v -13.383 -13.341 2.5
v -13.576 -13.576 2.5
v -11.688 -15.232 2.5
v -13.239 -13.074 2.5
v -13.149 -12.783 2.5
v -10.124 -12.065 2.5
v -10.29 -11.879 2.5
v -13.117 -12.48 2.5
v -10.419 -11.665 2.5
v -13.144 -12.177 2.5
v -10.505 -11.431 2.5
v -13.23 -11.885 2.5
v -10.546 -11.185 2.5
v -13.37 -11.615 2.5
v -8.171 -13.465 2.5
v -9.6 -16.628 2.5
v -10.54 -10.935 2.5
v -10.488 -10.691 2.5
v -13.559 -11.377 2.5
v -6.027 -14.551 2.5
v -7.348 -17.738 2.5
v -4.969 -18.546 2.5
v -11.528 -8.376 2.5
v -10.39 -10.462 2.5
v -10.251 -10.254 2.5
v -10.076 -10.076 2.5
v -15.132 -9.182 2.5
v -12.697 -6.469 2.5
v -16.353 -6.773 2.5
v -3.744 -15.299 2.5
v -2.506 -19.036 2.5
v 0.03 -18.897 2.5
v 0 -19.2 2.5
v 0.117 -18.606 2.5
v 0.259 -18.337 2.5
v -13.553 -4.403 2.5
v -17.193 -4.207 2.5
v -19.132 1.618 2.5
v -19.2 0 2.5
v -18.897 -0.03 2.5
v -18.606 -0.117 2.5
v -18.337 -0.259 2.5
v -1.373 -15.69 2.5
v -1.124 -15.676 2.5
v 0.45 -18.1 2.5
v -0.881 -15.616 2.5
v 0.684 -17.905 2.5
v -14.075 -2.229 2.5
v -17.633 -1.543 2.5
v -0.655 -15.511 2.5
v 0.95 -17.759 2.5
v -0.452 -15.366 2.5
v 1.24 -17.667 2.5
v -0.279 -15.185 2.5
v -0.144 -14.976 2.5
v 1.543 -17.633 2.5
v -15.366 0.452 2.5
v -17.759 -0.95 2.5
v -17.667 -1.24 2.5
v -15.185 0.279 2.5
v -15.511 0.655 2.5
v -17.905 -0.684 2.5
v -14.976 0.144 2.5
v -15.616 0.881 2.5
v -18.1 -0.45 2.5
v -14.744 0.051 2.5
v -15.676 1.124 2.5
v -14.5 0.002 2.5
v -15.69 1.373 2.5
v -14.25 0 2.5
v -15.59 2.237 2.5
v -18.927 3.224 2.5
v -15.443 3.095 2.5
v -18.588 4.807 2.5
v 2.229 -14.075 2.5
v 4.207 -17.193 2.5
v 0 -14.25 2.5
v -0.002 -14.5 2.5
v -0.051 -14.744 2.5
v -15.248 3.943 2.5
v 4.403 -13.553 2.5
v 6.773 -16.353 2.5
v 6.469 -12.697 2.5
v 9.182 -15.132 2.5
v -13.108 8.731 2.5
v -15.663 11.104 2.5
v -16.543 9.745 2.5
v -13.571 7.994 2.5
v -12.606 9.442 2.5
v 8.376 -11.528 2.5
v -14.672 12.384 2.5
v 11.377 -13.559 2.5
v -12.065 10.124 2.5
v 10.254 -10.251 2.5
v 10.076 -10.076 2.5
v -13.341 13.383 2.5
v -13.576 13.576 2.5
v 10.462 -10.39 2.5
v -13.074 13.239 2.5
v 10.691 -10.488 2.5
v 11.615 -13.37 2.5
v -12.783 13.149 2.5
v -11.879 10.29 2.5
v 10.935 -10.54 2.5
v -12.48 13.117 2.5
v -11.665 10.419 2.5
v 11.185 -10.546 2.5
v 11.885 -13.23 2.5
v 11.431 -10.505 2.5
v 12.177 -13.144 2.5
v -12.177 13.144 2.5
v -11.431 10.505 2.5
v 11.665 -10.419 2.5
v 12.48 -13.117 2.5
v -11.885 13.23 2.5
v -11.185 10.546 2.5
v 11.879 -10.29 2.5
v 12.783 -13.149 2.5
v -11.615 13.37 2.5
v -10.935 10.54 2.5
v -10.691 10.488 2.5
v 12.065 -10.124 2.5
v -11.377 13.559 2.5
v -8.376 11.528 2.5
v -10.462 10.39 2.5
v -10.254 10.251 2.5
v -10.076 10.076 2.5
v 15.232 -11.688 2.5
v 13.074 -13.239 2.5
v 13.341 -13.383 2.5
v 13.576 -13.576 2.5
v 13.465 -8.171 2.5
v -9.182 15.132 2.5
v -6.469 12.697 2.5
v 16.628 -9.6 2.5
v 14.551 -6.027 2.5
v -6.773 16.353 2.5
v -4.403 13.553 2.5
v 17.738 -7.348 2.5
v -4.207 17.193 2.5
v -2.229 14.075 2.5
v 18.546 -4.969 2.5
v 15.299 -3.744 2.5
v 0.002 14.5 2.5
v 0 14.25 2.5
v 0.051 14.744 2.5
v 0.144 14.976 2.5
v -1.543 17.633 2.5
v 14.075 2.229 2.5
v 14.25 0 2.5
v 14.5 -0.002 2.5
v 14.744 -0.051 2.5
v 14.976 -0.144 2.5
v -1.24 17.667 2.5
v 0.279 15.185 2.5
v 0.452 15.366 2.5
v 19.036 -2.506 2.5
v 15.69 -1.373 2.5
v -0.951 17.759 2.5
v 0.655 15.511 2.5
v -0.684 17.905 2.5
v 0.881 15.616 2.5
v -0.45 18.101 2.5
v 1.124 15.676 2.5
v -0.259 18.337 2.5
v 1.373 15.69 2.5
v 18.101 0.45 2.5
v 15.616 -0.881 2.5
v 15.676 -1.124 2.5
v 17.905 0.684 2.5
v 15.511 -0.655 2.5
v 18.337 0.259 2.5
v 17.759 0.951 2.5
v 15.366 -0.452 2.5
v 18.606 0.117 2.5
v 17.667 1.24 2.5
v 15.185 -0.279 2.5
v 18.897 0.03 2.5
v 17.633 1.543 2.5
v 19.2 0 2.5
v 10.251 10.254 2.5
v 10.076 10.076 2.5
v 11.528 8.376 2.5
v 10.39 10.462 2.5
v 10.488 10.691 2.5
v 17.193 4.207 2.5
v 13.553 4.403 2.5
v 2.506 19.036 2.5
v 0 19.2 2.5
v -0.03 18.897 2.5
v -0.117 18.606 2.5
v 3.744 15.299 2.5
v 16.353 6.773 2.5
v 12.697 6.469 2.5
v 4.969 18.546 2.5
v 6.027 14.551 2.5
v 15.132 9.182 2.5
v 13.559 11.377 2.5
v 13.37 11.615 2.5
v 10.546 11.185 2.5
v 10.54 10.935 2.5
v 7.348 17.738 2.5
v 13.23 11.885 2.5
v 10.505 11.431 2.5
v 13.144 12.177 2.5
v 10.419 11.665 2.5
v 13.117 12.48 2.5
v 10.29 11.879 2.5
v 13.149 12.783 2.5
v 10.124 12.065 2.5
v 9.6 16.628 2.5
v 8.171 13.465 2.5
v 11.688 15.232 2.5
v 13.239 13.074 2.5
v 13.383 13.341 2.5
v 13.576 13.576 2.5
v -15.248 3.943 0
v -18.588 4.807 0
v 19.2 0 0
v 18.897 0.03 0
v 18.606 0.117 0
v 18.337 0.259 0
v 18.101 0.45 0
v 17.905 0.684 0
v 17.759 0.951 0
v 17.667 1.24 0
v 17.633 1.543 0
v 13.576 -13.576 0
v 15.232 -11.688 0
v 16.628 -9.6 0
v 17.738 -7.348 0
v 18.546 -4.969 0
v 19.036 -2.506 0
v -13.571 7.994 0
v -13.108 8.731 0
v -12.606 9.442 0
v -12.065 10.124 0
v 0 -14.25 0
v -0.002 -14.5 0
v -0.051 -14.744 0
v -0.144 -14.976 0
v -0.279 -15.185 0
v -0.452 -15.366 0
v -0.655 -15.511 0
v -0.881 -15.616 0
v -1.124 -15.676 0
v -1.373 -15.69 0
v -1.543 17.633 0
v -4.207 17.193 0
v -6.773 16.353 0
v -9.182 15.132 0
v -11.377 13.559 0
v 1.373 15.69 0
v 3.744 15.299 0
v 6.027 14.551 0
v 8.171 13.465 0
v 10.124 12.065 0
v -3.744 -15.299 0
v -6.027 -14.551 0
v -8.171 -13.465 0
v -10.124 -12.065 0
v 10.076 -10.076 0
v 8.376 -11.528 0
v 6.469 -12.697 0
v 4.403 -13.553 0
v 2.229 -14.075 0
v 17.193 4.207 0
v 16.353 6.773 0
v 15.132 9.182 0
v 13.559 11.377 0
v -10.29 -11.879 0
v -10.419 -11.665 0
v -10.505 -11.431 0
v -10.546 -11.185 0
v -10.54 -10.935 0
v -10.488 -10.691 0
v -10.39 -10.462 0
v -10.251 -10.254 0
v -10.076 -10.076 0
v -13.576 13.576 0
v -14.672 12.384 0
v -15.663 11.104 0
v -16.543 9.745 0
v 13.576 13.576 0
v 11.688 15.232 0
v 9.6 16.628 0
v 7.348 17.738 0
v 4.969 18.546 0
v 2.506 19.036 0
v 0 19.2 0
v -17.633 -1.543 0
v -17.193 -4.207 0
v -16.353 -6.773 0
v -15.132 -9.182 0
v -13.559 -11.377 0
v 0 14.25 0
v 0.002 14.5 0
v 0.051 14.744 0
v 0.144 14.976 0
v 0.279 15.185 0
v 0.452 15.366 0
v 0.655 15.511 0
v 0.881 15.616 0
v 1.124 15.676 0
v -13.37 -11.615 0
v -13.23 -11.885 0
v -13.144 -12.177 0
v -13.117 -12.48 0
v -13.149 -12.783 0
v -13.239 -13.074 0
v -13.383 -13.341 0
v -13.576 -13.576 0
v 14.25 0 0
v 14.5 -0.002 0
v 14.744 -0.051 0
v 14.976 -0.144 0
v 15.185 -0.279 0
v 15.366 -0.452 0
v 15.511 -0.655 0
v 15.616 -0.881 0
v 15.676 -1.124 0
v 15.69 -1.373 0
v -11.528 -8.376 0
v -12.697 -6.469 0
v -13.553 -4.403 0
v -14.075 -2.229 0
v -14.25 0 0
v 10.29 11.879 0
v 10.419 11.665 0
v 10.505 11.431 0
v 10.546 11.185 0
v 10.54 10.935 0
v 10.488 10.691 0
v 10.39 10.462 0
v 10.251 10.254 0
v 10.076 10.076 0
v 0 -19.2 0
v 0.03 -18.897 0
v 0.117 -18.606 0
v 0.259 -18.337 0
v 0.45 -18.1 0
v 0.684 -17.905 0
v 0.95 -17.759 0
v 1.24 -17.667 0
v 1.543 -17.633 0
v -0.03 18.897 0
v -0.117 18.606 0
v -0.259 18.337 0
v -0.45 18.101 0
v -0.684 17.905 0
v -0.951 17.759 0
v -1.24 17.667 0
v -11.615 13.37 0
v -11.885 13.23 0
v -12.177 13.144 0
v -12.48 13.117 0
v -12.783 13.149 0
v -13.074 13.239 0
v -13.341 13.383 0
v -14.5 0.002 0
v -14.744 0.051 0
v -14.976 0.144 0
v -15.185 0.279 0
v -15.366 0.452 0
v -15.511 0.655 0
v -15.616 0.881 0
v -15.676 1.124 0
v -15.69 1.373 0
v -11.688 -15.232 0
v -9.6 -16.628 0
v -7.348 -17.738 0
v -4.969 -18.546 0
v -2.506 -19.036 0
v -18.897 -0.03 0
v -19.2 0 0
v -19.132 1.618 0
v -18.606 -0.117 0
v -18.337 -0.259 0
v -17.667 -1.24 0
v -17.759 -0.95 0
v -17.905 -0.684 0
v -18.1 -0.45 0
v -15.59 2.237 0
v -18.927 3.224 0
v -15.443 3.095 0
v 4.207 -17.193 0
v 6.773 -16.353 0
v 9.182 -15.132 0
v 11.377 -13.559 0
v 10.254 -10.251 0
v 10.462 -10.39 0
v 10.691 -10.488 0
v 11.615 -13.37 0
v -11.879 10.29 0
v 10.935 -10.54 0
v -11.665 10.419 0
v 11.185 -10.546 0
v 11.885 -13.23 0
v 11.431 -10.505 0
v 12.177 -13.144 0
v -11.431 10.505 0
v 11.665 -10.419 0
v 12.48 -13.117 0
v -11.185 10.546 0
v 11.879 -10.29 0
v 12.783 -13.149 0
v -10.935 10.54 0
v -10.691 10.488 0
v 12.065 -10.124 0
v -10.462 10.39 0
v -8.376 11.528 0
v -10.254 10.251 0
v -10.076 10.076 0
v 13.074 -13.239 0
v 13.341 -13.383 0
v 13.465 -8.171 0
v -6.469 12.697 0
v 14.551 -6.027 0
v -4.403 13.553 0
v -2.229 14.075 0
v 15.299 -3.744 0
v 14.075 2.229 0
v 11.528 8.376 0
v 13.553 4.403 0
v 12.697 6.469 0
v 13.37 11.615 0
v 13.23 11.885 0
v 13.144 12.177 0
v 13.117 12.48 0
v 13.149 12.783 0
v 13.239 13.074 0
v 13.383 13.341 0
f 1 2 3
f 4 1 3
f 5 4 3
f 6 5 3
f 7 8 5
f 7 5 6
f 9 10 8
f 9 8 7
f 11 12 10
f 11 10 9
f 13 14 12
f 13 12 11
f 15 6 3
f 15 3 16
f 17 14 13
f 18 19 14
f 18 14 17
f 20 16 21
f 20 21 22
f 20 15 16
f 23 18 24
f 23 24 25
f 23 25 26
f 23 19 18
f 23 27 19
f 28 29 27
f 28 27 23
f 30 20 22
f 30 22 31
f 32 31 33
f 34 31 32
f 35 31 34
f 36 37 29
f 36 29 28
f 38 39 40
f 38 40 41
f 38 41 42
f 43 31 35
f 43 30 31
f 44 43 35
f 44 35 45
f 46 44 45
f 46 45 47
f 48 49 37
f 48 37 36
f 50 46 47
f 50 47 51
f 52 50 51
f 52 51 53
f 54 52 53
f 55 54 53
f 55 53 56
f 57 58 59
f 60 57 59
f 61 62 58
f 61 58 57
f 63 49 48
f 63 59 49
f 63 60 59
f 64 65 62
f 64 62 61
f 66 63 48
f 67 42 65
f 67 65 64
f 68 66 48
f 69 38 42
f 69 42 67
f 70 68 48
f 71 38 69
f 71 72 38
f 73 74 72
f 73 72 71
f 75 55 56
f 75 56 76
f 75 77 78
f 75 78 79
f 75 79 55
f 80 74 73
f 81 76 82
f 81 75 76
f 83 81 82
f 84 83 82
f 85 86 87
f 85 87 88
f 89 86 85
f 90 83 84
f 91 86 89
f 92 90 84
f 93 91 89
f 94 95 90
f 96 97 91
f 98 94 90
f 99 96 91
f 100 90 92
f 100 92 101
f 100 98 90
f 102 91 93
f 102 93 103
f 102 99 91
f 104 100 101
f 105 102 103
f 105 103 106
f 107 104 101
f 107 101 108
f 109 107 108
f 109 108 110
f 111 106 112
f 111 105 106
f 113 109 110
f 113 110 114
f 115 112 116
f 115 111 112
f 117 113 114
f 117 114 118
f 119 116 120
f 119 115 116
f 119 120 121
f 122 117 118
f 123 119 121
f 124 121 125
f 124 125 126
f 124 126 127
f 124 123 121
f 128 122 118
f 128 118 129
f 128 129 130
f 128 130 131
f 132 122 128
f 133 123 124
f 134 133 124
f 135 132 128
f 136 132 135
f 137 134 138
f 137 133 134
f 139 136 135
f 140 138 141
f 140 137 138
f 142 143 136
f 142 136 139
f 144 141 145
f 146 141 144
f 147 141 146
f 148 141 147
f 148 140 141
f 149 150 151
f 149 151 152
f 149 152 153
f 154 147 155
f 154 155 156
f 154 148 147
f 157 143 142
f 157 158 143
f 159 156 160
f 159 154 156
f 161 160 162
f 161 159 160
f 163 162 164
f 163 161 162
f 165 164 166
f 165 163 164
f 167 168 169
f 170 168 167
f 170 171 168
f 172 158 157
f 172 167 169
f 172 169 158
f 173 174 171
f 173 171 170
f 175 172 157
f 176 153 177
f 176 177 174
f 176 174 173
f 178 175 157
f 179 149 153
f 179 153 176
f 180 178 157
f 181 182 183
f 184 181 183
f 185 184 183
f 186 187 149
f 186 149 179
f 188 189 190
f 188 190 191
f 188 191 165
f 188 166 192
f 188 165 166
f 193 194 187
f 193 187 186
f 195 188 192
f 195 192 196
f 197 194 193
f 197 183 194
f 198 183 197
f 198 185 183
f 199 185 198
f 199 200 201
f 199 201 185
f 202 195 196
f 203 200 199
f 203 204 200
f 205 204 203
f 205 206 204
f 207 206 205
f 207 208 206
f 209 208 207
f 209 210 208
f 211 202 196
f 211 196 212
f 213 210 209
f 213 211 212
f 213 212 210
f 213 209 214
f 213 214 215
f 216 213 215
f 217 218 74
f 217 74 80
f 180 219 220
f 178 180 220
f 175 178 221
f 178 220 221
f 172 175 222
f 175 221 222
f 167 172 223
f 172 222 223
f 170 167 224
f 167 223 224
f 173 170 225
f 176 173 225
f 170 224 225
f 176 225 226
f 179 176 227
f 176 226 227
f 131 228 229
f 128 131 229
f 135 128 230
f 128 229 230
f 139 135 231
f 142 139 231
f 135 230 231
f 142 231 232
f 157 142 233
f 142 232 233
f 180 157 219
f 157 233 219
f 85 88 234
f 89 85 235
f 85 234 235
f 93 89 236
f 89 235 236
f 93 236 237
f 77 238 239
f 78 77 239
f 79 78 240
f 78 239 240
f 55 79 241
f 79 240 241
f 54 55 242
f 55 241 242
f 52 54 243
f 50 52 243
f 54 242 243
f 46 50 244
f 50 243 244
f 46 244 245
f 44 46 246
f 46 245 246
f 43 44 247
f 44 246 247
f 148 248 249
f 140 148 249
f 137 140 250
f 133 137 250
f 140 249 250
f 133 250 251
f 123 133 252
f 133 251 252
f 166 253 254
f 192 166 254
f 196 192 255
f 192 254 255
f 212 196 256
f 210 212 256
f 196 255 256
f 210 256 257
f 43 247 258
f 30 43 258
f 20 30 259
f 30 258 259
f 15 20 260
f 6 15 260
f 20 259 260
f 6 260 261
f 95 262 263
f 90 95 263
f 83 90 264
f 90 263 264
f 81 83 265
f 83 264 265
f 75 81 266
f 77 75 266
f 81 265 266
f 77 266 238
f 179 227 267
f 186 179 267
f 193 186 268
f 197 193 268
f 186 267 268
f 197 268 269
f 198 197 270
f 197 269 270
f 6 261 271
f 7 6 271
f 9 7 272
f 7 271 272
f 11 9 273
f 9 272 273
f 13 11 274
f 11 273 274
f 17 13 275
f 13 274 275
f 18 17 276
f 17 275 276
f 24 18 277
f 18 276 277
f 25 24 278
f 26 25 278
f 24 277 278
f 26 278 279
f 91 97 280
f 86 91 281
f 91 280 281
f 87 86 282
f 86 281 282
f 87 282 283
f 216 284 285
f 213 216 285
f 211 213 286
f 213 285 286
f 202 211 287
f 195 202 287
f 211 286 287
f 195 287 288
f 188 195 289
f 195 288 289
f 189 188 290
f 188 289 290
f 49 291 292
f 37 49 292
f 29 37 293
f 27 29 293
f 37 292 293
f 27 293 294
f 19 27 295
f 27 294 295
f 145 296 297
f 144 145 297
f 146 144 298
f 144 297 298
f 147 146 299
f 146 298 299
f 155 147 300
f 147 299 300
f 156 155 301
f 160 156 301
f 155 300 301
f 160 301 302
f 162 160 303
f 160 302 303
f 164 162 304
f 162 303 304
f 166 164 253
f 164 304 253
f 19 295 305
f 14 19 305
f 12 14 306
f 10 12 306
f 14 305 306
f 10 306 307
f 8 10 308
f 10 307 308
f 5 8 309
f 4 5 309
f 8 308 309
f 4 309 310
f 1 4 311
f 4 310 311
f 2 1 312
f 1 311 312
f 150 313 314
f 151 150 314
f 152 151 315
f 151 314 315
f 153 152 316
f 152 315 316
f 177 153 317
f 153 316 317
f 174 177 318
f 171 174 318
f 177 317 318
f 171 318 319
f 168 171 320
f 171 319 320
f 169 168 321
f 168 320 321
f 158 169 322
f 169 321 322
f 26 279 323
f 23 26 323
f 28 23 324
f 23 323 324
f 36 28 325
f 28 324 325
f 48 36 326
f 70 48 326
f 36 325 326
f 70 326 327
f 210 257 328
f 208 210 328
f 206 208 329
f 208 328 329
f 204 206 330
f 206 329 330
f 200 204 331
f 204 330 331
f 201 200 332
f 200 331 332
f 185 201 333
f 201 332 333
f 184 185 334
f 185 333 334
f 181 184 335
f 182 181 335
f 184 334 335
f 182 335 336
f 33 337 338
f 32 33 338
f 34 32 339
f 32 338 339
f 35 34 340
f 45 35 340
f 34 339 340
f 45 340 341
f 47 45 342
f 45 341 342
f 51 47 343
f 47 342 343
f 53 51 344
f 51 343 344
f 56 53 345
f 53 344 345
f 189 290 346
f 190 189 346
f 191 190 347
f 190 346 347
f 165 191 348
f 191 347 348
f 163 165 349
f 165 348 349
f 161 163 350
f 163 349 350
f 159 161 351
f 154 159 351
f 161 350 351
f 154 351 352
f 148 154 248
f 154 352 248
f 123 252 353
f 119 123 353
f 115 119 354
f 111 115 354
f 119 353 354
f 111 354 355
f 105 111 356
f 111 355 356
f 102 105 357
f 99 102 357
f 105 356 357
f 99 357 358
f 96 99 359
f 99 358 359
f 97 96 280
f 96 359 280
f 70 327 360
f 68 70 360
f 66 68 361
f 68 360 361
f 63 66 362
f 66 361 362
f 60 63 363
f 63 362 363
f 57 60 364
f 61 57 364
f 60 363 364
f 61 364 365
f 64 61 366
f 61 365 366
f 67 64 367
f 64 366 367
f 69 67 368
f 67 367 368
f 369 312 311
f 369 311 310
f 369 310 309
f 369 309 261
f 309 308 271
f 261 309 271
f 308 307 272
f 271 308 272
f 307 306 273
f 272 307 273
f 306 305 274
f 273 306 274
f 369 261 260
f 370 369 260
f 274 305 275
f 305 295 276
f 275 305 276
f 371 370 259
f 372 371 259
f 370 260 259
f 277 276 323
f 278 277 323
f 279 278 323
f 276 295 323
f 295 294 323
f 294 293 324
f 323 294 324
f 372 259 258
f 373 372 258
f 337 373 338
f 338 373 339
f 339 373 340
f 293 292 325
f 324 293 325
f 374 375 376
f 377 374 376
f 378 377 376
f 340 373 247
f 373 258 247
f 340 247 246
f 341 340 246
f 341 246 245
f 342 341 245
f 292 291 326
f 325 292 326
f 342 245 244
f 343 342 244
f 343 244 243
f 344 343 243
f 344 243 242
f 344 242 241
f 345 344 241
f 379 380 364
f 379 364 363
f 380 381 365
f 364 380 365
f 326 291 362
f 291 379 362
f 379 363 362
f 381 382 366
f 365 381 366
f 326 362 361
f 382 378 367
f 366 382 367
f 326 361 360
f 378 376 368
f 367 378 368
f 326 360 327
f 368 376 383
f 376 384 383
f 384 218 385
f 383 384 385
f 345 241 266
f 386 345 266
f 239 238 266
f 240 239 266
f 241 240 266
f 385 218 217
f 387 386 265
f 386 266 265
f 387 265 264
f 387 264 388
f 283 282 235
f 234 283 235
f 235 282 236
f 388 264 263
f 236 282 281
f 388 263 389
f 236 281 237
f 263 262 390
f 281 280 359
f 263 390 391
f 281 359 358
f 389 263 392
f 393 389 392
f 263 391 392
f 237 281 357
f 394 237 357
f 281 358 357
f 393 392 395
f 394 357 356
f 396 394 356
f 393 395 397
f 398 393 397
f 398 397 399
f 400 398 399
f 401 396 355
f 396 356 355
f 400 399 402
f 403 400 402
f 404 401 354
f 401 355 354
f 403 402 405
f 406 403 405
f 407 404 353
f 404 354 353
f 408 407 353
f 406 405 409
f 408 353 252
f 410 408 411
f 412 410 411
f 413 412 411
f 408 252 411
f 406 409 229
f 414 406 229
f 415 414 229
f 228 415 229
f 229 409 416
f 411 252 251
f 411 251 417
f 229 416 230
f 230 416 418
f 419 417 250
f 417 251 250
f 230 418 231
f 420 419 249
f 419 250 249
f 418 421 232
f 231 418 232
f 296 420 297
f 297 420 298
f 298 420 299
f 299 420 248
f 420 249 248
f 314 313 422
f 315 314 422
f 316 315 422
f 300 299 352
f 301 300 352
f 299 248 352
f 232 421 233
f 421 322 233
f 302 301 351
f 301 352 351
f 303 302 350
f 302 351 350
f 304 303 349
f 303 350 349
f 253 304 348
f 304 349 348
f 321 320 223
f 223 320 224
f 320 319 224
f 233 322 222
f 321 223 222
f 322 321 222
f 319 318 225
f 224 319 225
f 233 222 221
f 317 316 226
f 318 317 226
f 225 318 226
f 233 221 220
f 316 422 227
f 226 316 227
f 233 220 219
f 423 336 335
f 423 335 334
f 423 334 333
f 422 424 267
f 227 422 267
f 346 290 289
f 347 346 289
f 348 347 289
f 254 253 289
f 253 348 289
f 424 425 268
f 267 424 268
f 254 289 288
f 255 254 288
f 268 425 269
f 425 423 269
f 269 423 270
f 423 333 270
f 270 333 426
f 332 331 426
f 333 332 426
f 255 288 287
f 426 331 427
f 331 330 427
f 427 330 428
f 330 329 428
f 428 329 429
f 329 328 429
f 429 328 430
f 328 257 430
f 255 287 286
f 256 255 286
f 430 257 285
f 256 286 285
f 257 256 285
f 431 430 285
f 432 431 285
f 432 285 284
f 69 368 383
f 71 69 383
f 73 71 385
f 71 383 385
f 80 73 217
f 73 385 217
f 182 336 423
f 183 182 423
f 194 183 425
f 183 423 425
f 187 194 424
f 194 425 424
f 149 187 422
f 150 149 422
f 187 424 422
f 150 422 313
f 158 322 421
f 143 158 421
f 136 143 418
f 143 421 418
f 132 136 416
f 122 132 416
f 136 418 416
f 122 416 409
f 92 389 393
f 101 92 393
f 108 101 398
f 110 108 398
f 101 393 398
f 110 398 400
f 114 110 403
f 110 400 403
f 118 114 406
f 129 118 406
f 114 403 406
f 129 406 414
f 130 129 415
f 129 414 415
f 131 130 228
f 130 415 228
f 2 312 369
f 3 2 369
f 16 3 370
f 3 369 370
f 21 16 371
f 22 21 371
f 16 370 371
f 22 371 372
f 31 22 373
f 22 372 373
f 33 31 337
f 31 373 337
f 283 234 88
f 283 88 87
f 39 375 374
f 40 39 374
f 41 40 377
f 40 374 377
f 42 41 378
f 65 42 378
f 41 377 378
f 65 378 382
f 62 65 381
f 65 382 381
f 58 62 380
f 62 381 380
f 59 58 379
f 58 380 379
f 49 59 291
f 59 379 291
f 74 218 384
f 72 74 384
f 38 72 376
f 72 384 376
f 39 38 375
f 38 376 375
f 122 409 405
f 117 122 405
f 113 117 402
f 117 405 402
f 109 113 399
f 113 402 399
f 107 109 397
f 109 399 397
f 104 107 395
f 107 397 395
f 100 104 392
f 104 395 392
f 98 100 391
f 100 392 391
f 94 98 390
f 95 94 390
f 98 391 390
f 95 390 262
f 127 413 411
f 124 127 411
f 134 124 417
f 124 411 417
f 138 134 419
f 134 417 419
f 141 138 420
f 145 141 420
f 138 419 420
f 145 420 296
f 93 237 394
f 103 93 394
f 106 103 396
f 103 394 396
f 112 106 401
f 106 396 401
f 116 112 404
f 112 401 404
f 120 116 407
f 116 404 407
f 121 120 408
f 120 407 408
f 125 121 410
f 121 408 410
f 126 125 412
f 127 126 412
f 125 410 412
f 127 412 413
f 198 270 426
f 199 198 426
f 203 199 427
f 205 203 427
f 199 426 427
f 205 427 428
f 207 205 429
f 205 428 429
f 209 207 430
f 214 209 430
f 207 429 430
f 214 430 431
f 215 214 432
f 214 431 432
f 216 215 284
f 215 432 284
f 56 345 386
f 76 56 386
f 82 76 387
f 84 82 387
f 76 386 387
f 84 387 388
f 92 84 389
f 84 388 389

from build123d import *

# Parameters (mm, degrees)
F1_DEPTH = 2.5
F3_DEPTH = 2.501


with BuildPart() as f1:
    # F0 (on Top) → F1 (new body)
    with BuildSketch(Plane.XY):
        with BuildLine():
            ThreePointArc((-11.3773406915, 13.5589866432), (-12.4804717144, 13.1173744075), (-13.5764501988, 13.5764501988))
            ThreePointArc((-13.5764501988, 13.5764501988), (-17.7384870242, 7.3475219014), (-19.2, 0))
            ThreePointArc((-19.2, 0), (-18.1004105765, -0.4503582132), (-17.6326461562, -1.5426566466))
            ThreePointArc((-17.6326461562, -1.5426566466), (-16.3526677254, -6.7734967529), (-13.5589866432, -11.3773406915))
            ThreePointArc((-13.5589866432, -11.3773406915), (-13.1173744075, -12.4804717144), (-13.5764501988, -13.5764501988))
            ThreePointArc((-13.5764501988, -13.5764501988), (-7.3475219014, -17.7384870242), (0, -19.2))
            ThreePointArc((0, -19.2), (0.4503582132, -18.1004105765), (1.5426566466, -17.6326461562))
            ThreePointArc((1.5426566466, -17.6326461562), (6.7734967529, -16.3526677254), (11.3773406915, -13.5589866432))
            ThreePointArc((11.3773406915, -13.5589866432), (12.4804717144, -13.1173744075), (13.5764501988, -13.5764501988))
            ThreePointArc((13.5764501988, -13.5764501988), (17.7384870242, -7.3475219014), (19.2, 0))
            ThreePointArc((19.2, 0), (18.1005373282, 0.4504869942), (17.6326461562, 1.5426566466))
            ThreePointArc((17.6326461562, 1.5426566466), (16.3526677254, 6.7734967529), (13.5589866432, 11.3773406915))
            ThreePointArc((13.5589866432, 11.3773406915), (13.1173744075, 12.4804717144), (13.5764501988, 13.5764501988))
            ThreePointArc((13.5764501988, 13.5764501988), (7.3475219014, 17.7384870242), (0, 19.2))
            ThreePointArc((0, 19.2), (-0.4504869942, 18.1005373282), (-1.5426566466, 17.6326461562))
            ThreePointArc((-1.5426566466, 17.6326461562), (-6.7734967529, 16.3526677254), (-11.3773406915, 13.5589866432))
        make_face()
        with BuildLine():
            ThreePointArc((15.6900664949, -1.3727029483), (14.5511026371, -6.0272640598), (12.0651999791, -10.1239048526))
            ThreePointArc((12.0651999791, -10.1239048526), (11.0599850614, -10.5489862891), (10.0762716319, -10.0762716319))
            ThreePointArc((10.0762716319, -10.0762716319), (5.4532389112, -13.1652833383), (0, -14.25))
            ThreePointArc((0, -14.25), (-0.3613316509, -15.2798492672), (-1.3727029483, -15.6900664949))
            ThreePointArc((-1.3727029483, -15.6900664949), (-6.0272640598, -14.5511026371), (-10.1239048526, -12.0651999791))
            ThreePointArc((-10.1239048526, -12.0651999791), (-10.5489862891, -11.0599850614), (-10.0762716319, -10.0762716319))
            ThreePointArc((-10.0762716319, -10.0762716319), (-13.1652833383, -5.4532389112), (-14.25, 0))
            ThreePointArc((-14.25, 0), (-15.2798501764, 0.3613306971), (-15.6900664949, 1.3727029483))
            ThreePointArc((-15.6900664949, 1.3727029483), (-14.5511026371, 6.0272640598), (-12.0651999791, 10.1239048526))
            ThreePointArc((-12.0651999791, 10.1239048526), (-11.0599850614, 10.5489862891), (-10.0762716319, 10.0762716319))
            ThreePointArc((-10.0762716319, 10.0762716319), (-5.4532389112, 13.1652833383), (0, 14.25))
            ThreePointArc((0, 14.25), (0.3613306971, 15.2798501764), (1.3727029483, 15.6900664949))
            ThreePointArc((1.3727029483, 15.6900664949), (6.0272640598, 14.5511026371), (10.1239048526, 12.0651999791))
            ThreePointArc((10.1239048526, 12.0651999791), (10.5489862891, 11.0599850614), (10.0762716319, 10.0762716319))
            ThreePointArc((10.0762716319, 10.0762716319), (13.1652833383, 5.4532389112), (14.25, 0))
            ThreePointArc((14.25, 0), (15.2798501764, -0.3613306971), (15.6900664949, -1.3727029483))
        make_face(mode=Mode.SUBTRACT)
    extrude(amount=F1_DEPTH)

    # F2 (on Top) → F3 (cut, through all)
    with BuildSketch(Plane.XY):
        with BuildLine():
            Line((-18.5884346953, 4.8072960778), (-15.248325336, 3.9434850639))
            ThreePointArc((-15.248325336, 3.9434850639), (-14.5511026371, 6.0272640598), (-13.570659277, 7.9937292166))
            Line((-13.570659277, 7.9937292166), (-16.5432798805, 9.7447365688))
            ThreePointArc((-16.5432798805, 9.7447365688), (-17.7384870242, 7.3475219014), (-18.5884346953, 4.8072960778))
        make_face()
    extrude(amount=F3_DEPTH, mode=Mode.SUBTRACT)


solid = f1.part
